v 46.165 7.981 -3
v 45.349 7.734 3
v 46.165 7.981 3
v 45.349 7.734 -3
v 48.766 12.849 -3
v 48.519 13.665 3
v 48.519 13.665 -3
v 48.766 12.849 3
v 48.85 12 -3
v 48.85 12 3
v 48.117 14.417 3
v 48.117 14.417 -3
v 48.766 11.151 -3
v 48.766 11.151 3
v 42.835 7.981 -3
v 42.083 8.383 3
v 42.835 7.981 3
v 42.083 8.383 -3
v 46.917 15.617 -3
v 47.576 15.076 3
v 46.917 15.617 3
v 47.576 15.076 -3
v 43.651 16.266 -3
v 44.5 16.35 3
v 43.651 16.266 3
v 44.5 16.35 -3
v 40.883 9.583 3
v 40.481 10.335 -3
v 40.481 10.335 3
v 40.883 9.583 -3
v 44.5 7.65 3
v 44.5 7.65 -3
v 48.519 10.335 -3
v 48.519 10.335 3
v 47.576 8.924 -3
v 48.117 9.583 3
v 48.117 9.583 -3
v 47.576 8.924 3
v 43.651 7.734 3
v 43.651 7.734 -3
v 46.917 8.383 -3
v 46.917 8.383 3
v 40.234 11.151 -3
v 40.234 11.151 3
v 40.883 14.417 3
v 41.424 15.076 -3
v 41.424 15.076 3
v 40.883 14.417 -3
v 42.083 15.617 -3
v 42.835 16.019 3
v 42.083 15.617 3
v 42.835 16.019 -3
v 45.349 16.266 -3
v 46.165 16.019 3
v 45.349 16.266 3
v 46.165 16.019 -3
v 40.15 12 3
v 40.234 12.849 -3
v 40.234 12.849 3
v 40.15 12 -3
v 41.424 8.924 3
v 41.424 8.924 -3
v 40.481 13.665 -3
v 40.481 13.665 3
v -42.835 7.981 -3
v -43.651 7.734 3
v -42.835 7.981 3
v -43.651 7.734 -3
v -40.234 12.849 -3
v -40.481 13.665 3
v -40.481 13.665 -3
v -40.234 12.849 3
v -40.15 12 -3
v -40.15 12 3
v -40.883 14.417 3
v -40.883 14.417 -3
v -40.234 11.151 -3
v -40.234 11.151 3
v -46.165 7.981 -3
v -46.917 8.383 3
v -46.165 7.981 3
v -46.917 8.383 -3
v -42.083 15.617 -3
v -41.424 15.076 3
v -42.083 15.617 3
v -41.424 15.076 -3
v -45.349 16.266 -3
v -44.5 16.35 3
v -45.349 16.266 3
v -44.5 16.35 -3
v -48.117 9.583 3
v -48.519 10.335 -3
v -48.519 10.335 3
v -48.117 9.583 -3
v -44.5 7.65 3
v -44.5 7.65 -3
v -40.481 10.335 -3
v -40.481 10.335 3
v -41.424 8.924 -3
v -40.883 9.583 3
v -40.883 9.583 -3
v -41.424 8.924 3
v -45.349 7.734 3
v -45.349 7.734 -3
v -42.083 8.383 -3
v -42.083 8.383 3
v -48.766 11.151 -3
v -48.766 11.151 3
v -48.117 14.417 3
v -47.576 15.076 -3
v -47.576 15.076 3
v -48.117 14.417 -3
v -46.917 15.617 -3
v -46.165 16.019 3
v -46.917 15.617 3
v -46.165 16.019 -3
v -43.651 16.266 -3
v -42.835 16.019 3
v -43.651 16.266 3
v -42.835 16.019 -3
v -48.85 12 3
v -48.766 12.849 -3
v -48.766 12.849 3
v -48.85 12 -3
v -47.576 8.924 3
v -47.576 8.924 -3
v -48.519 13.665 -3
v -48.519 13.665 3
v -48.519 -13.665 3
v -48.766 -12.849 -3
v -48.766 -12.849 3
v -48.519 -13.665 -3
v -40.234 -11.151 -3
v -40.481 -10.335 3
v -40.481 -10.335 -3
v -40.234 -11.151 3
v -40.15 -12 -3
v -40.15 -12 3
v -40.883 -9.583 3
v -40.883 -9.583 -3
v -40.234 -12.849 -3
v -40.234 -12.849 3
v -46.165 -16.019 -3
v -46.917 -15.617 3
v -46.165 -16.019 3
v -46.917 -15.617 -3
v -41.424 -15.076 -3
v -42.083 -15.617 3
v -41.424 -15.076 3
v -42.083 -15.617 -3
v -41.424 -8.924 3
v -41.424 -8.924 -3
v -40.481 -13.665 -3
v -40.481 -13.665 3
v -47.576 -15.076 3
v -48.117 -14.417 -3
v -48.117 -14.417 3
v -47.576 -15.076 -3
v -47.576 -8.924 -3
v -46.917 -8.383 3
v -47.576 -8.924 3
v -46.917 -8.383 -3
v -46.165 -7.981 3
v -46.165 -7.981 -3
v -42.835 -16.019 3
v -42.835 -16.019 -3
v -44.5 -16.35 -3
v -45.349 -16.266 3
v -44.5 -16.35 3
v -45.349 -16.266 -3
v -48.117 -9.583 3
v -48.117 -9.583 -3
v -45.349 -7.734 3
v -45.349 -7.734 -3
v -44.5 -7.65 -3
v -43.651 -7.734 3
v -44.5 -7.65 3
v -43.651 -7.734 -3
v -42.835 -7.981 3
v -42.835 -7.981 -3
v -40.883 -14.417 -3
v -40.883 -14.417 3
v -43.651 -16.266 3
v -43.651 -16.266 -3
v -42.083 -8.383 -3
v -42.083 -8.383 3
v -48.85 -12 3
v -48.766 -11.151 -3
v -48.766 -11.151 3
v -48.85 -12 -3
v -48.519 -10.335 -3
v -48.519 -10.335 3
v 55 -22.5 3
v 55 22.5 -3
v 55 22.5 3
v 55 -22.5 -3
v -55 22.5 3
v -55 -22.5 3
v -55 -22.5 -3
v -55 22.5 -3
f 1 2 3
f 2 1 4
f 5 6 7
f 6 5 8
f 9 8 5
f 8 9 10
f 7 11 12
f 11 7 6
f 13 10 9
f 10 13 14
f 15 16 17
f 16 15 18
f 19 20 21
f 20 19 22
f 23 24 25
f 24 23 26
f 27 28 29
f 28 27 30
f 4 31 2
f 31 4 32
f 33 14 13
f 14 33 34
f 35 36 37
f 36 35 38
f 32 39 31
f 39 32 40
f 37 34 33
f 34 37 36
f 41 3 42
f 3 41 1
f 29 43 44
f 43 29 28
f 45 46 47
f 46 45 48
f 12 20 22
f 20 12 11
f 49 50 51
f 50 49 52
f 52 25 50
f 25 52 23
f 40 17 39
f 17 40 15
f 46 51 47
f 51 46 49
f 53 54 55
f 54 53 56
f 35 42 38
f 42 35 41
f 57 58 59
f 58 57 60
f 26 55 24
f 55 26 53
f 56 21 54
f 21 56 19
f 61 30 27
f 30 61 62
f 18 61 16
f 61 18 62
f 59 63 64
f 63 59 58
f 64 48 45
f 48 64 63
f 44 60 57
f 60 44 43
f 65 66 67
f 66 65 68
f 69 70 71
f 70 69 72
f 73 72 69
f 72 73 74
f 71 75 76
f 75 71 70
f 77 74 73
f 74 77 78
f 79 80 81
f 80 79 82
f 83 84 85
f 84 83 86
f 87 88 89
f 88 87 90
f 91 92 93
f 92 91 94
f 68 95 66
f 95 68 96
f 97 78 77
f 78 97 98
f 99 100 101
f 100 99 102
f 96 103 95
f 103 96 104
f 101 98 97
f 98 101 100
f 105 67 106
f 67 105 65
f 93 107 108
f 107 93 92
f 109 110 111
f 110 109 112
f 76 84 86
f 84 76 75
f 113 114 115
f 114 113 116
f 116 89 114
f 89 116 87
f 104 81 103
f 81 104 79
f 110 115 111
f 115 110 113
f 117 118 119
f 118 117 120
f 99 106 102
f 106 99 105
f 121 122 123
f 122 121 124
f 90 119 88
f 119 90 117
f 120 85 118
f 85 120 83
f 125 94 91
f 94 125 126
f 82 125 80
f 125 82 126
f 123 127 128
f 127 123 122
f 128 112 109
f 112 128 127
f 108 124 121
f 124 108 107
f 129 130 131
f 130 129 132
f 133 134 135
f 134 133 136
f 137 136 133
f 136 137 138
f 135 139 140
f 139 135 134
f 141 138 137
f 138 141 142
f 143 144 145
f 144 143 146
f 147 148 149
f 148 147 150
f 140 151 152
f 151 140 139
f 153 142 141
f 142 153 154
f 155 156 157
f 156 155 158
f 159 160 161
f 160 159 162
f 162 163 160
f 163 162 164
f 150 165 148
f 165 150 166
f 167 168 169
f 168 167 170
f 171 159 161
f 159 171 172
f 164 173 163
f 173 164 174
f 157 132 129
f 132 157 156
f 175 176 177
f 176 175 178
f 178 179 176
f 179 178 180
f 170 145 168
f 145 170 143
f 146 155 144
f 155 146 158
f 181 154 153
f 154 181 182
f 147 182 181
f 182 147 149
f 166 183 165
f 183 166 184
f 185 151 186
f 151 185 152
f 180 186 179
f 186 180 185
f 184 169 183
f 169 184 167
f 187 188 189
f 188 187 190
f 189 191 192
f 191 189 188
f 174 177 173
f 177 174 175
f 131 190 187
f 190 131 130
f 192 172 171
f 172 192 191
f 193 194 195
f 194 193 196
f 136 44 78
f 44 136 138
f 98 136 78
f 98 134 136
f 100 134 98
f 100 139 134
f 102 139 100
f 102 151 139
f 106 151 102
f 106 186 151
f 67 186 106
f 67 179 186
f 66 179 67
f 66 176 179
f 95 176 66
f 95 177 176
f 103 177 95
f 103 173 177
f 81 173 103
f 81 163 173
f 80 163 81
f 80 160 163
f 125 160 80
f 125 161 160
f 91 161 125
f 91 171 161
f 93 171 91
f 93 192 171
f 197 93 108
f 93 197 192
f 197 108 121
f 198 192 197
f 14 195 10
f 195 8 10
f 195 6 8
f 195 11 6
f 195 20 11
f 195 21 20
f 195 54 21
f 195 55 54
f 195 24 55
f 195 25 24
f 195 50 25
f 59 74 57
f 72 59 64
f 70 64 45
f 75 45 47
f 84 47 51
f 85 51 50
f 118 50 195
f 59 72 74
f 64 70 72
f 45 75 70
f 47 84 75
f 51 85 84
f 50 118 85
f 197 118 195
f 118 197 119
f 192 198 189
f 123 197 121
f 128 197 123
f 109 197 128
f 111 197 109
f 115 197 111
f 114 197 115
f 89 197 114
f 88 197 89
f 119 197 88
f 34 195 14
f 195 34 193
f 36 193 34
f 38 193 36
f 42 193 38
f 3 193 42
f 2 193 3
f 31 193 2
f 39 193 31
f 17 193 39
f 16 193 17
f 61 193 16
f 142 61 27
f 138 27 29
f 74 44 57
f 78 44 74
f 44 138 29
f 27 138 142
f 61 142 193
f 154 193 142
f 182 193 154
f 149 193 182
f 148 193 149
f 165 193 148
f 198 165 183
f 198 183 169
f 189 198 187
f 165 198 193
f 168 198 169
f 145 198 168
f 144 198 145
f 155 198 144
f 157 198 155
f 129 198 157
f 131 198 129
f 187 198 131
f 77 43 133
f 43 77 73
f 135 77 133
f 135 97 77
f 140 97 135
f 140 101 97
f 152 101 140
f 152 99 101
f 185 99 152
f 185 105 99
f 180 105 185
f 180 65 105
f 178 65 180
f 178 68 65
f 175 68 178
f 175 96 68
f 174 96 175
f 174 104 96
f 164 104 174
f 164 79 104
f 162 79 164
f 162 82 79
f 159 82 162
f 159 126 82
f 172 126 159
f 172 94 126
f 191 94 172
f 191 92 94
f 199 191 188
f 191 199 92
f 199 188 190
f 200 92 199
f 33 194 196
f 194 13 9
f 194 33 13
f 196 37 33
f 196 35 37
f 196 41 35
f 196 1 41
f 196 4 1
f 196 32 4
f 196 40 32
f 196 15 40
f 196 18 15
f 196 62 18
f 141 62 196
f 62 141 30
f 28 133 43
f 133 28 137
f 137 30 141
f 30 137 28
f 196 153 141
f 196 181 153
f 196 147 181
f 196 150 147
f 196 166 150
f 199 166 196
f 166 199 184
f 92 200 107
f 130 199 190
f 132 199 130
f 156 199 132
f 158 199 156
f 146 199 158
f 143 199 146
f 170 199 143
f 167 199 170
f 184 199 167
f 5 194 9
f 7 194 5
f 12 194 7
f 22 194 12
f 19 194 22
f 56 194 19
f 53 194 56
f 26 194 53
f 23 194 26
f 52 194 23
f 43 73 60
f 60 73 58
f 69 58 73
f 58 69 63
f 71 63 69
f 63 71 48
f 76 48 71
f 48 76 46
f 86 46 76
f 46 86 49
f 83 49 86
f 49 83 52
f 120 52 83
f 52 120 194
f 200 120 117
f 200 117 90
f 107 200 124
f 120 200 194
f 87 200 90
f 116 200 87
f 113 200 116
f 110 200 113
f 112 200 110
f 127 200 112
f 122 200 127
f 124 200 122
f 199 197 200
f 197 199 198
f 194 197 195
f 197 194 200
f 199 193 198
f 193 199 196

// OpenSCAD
$fn = 32;

// ----------------------------------------------------------------------
// Corner plate 110 x 45 x 6
// 3 holes, centres taken from the edge offset
// ----------------------------------------------------------------------

// --- parameters (mm) ---
plate = [110, 45, 6];   // overall size (x, y, z)
holes = 3;              // number of holes the drawing asks for
bore_d = 8.4;           // nominal hole diameter from the drawing
print_allowance = 0.3;  // clearance added for printing
edge = 10.5;            // hole centre offset from the plate edge

// --- derived feature positions (mm) ---
hole_d = bore_d + print_allowance;  // = 8.7   hole diameter as printed
corner_x = plate[0] / 2 - edge;     // = 44.5   corner hole X
corner_y = plate[1] / 2 - edge;     // = 12   corner hole Y
feature_centers = [
  [corner_x, corner_y],
  [-corner_x, corner_y],
  [-corner_x, -corner_y]
];   // hole centres the loop below drills

// plate outline, every hole drilled through with the same cutters
difference() {
  cube(plate, center = true);
  for (centre = feature_centers)
    translate([centre[0], centre[1], 0])
      cylinder(d = hole_d, h = plate[2] + 2, center = true);
}
